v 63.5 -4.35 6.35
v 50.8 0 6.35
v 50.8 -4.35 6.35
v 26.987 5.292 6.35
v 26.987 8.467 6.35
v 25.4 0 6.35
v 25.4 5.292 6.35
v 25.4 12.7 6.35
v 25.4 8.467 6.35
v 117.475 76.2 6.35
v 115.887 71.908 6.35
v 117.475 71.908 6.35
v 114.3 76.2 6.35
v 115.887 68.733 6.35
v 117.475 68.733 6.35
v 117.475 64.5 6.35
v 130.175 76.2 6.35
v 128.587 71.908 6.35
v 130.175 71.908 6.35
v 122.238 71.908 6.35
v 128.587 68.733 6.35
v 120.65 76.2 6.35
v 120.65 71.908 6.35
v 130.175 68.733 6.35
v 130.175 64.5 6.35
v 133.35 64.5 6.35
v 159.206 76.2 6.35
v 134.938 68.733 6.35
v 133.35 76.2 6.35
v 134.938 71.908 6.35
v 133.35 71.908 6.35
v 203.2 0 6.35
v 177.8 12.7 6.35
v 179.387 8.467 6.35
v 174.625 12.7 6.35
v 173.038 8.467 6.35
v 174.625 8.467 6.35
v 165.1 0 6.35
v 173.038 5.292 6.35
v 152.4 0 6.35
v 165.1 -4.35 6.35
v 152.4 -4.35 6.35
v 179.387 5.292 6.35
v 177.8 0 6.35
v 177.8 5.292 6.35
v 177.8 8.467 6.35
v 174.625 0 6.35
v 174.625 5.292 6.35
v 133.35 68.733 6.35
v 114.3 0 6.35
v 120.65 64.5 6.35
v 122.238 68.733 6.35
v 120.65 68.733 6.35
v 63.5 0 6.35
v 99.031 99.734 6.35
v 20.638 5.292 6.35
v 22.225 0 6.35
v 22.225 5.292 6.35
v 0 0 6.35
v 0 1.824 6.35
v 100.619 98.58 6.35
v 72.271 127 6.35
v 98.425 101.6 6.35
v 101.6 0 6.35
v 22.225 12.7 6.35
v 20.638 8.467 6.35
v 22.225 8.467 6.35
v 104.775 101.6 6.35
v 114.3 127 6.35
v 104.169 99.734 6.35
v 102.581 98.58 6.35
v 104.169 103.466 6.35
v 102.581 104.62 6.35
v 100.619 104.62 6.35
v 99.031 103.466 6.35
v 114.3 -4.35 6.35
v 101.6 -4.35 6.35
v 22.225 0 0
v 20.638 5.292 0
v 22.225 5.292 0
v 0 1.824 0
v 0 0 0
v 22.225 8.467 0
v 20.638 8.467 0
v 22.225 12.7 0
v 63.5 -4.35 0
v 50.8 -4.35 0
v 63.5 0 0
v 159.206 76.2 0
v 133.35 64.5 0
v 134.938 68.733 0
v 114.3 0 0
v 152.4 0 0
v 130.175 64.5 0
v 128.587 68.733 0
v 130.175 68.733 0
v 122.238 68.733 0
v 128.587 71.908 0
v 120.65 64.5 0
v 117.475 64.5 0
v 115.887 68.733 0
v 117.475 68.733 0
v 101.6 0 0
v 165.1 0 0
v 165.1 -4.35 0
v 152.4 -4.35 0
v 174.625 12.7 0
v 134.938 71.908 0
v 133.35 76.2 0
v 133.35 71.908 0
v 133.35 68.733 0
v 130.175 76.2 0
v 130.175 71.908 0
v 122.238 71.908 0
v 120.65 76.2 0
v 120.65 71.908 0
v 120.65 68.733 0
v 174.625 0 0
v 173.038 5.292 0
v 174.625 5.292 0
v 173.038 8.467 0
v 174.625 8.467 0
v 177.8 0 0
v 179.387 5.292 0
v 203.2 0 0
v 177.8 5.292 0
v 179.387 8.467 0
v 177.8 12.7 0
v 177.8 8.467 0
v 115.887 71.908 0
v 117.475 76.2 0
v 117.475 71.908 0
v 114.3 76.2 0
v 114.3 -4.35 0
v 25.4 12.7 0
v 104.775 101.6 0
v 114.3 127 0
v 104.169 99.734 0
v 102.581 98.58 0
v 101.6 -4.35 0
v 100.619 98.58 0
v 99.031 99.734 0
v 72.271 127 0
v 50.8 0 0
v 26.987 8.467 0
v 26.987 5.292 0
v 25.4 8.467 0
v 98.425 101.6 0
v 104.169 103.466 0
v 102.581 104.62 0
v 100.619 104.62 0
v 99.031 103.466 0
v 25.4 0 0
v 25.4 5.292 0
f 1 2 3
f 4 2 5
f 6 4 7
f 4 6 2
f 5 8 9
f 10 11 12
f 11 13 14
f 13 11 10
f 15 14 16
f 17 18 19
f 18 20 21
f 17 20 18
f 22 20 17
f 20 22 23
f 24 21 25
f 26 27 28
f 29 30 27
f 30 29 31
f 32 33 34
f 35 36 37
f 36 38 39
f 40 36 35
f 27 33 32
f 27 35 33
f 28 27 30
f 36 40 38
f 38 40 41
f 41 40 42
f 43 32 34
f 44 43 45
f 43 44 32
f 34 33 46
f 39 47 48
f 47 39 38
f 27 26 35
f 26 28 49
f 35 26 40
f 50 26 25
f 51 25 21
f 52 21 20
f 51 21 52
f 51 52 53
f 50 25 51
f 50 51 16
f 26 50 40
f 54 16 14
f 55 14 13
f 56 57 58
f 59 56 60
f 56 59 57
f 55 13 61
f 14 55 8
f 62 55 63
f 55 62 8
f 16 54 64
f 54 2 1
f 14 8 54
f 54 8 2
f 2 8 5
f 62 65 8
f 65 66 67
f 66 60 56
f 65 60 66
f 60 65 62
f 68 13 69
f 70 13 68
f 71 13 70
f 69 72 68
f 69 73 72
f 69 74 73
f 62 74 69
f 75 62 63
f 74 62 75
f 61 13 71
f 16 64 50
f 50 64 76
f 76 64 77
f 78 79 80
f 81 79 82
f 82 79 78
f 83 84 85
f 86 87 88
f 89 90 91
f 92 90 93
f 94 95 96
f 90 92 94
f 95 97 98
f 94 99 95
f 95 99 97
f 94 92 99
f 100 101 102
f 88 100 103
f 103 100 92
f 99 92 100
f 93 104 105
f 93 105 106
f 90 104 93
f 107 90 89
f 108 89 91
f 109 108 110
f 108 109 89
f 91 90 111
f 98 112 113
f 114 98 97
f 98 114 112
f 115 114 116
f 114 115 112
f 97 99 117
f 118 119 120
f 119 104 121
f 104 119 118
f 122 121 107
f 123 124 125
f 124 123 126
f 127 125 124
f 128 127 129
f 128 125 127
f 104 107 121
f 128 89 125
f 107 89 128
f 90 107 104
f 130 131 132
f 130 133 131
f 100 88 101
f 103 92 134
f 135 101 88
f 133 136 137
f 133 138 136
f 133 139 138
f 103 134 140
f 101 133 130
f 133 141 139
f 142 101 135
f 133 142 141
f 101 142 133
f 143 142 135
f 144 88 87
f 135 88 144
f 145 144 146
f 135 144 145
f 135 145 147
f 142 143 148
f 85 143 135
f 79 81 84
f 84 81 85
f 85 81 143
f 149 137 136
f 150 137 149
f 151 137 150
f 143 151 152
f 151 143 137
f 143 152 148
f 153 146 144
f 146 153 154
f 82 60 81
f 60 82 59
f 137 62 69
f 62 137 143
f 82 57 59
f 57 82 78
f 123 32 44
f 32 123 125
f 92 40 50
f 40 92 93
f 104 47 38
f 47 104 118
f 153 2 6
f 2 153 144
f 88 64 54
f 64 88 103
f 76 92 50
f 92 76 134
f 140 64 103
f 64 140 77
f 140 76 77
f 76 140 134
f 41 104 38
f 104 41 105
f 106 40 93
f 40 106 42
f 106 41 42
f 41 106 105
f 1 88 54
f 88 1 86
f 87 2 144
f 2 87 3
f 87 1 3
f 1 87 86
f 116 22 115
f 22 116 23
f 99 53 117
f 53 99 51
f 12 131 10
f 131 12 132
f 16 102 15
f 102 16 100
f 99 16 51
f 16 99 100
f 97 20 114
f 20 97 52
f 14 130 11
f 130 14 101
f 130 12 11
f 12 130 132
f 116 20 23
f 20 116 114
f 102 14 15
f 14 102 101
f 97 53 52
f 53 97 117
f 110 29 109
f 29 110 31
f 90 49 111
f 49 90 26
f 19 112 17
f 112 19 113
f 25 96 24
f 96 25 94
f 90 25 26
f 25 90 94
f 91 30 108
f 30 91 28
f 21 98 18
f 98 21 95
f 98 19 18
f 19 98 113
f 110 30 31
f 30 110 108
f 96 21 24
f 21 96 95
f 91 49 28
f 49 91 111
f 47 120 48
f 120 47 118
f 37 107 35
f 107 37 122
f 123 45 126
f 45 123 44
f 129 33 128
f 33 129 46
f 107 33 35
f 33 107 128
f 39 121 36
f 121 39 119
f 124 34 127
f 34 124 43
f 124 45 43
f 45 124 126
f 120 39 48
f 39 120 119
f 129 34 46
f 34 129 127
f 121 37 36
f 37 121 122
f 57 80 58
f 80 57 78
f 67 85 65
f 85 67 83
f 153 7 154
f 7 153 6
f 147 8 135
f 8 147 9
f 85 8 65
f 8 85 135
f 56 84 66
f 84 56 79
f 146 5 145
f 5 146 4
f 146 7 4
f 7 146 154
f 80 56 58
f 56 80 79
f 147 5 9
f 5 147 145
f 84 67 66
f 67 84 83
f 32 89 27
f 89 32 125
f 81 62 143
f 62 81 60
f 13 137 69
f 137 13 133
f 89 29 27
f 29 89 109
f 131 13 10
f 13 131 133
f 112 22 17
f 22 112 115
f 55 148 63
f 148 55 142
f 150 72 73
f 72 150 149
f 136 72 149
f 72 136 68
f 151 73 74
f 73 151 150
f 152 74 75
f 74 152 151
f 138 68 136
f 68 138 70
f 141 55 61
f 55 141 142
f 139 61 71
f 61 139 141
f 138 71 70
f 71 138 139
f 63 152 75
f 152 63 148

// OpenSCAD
function mm(i) = i*25.4; 
    rolldiam = mm(8); //diameter of the roll of paper
    tubediam = mm(2); //diameter of the cardboard tube at the center
	 thickness= mm(.25); // thickness of material
	 boltwidth = mm(1/8); // desired diameter of bolt holes
	 boltdepth = mm(.5); // desired depth of bolts
	 nutwidth = mm(1/4); //desired width of nuts
	 nutheight = mm(1/8); //desired height of nuts
	 roddiam = mm(1/4); // diameter of the rod the spool is hung on

module bolthole(thickness=mm(.25), rolldiam=mm(8), tubediam=mm(2))
	{
	union()
		{
			cube ([boltwidth, boltdepth+1, thickness+2]);
			translate([-(nutwidth/2-boltwidth/2), boltdepth/3, 0])
				{
					cube([nutwidth, nutheight, thickness+2]);
				}
		}
	}

	 

module side(thickness=mm(.25), rolldiam=mm(8), tubediam=mm(2),roddiam = mm(1/4)) 
    { 
			 difference() 
         { 
         		union()
				{
			cube([rolldiam, rolldiam/2-tubediam/2+mm(2), thickness]);
			
			translate([rolldiam/2, -thickness+2, 0])
						{
						cube ([mm(.5), thickness, thickness]);	
						}
			translate([rolldiam/2+rolldiam/4, -thickness+2, 0])
						{
						cube ([mm(.5), thickness, thickness]);	
						}
				translate([rolldiam/4, -thickness+2, 0])
						{
						cube ([mm(.5), thickness, thickness]);	
						}
				}
				translate([rolldiam, 0, -1])
					{
					rotate([0, 0, 30])
						{
						cube([rolldiam, rolldiam, thickness+2]);
						}
					}
				rotate([0,0,180])
					{
					translate([-rolldiam/2, -rolldiam+mm(1), -1])
						{
						rotate([0, 0, -30])
							{
							cube([rolldiam, rolldiam, thickness+2]);
							}
						}
					}
				translate([3*(rolldiam/2-tubediam/2)/2, (rolldiam/2-tubediam/2), -1])
				{
					cube ([rolldiam/2-tubediam/2, rolldiam/2-tubediam/2, thickness+2]);
				}
				translate([3*(rolldiam/2-tubediam/2)/2+mm(.25/2), (rolldiam/2-tubediam/2)-boltdepth+1, -1])
				{
					bolthole();
				}
				translate([3*(rolldiam/2-tubediam/2)/2+mm(.25/2+.5), (rolldiam/2-tubediam/2)-boltdepth+1, -1])
				bolthole();

				translate([rolldiam -mm(1), boltdepth, -1])
					rotate([0,0,180])
						{
							bolthole();
						}
				translate([mm(1), boltdepth, -1])
					rotate([0,0,180])
						{
							bolthole();
						}
										
				translate([rolldiam/2, rolldiam/2, -1])
						{
						cylinder(thickness+2, roddiam/2, roddiam/2, 0);
						}


//				translate([rolldiam/2-tubediam/2+mm(1), rolldiam/2, -1])
//					{
//						cylinder(thickness+2, boltwidth/2, boltwidth/2, 0);
//					}
//				translate([rolldiam/2-tubediam/2+mm(.5), rolldiam/2, -1])
//					{
//						cylinder(thickness+2, boltwidth/2, boltwidth/2, 0);
//					}
//				translate([rolldiam/2-tubediam/2+mm(.5), rolldiam/2-mm(.5), -1])
//					{
//						cylinder(thickness+2, boltwidth/2, boltwidth/2, 0);
//					}
//				translate([rolldiam/2-tubediam/2+mm(1), rolldiam/2-mm(.5), -1])
//					{
//						cylinder(thickness+2, boltwidth/2, boltwidth/2, 0);
//					}

	 }
}



side();

module tubehold(tubediam=mm(2),thickness=mm(.25), rolldiam=mm(8),) 
    {
		translate([rolldiam/2-mm(.25), rolldiam/2-tubediam/2+mm(1)-mm(.25), 0])
			{
			cylinder(thickness+2, tubediam/2, tubediam/2, 0);
			}
	 }

//#tubehold();



//	cube([rollheight+mm(2), (rolldiam/2-tubediam/2)+mm(.5), thickness])//;
    
//              translate([mm(.75), -1, -1]) 
//              { 
  //               cube([rollheight+mm(.5), (rolldiam/2-tubediam/2)+1,thickness+2]);
 //   			  }
//		 translate([mm(.375)-mm(.375/2), mm(.25/2), -1]) 
//             { 
 //                cylinder(thickness+2, boltwidth/2, boltwidth/2, 0);
 //            } 
//		 translate([mm(.375)+mm(.375/2), mm(.25/2), -1]) 
 //            { 
 //                cylinder(thickness+2, boltwidth/2, boltwidth/2, 0);
  //           } 
	//	 translate([mm(.375)+mm(.375/2), mm(.25+.25/2), -1]) 
   //          { 
    //             cylinder(thickness+2, boltwidth/2, boltwidth/2, 0);
  //           } 
	//	 translate([mm(.375)-mm(.375/2), mm(.25+.25/2), -1]) 
  //           { 
  //               cylinder(thickness+2, boltwidth/2, boltwidth/2, 0);
  //           } 
//			translate([rollheight+mm(1.25), 0, -1])
//			{
//				 translate([mm(.375)-mm(.375/2), mm(.25/2), -1]) 
 //            	{ 
 //                cylinder(thickness+2, boltwidth/2, boltwidth/2, 0);
 //           	} 
//				 translate([mm(.375)+mm(.375/2), mm(.25/2), -1]) 
 //            	{ 
  //               cylinder(thickness+2, boltwidth/2, boltwidth/2, 0);
//             	} 
//		 		translate([mm(.375)+mm(.375/2), mm(.25+.25/2), -1]) 
//             	{ 
//                 cylinder(thickness+2, boltwidth/2, boltwidth/2, 0);
//             	} 
//
  //
    //             cylinder(thickness+2, boltwidth/2, boltwidth/2, 0);
    //         	} 
		//}		
	//}
// }   
    


   
